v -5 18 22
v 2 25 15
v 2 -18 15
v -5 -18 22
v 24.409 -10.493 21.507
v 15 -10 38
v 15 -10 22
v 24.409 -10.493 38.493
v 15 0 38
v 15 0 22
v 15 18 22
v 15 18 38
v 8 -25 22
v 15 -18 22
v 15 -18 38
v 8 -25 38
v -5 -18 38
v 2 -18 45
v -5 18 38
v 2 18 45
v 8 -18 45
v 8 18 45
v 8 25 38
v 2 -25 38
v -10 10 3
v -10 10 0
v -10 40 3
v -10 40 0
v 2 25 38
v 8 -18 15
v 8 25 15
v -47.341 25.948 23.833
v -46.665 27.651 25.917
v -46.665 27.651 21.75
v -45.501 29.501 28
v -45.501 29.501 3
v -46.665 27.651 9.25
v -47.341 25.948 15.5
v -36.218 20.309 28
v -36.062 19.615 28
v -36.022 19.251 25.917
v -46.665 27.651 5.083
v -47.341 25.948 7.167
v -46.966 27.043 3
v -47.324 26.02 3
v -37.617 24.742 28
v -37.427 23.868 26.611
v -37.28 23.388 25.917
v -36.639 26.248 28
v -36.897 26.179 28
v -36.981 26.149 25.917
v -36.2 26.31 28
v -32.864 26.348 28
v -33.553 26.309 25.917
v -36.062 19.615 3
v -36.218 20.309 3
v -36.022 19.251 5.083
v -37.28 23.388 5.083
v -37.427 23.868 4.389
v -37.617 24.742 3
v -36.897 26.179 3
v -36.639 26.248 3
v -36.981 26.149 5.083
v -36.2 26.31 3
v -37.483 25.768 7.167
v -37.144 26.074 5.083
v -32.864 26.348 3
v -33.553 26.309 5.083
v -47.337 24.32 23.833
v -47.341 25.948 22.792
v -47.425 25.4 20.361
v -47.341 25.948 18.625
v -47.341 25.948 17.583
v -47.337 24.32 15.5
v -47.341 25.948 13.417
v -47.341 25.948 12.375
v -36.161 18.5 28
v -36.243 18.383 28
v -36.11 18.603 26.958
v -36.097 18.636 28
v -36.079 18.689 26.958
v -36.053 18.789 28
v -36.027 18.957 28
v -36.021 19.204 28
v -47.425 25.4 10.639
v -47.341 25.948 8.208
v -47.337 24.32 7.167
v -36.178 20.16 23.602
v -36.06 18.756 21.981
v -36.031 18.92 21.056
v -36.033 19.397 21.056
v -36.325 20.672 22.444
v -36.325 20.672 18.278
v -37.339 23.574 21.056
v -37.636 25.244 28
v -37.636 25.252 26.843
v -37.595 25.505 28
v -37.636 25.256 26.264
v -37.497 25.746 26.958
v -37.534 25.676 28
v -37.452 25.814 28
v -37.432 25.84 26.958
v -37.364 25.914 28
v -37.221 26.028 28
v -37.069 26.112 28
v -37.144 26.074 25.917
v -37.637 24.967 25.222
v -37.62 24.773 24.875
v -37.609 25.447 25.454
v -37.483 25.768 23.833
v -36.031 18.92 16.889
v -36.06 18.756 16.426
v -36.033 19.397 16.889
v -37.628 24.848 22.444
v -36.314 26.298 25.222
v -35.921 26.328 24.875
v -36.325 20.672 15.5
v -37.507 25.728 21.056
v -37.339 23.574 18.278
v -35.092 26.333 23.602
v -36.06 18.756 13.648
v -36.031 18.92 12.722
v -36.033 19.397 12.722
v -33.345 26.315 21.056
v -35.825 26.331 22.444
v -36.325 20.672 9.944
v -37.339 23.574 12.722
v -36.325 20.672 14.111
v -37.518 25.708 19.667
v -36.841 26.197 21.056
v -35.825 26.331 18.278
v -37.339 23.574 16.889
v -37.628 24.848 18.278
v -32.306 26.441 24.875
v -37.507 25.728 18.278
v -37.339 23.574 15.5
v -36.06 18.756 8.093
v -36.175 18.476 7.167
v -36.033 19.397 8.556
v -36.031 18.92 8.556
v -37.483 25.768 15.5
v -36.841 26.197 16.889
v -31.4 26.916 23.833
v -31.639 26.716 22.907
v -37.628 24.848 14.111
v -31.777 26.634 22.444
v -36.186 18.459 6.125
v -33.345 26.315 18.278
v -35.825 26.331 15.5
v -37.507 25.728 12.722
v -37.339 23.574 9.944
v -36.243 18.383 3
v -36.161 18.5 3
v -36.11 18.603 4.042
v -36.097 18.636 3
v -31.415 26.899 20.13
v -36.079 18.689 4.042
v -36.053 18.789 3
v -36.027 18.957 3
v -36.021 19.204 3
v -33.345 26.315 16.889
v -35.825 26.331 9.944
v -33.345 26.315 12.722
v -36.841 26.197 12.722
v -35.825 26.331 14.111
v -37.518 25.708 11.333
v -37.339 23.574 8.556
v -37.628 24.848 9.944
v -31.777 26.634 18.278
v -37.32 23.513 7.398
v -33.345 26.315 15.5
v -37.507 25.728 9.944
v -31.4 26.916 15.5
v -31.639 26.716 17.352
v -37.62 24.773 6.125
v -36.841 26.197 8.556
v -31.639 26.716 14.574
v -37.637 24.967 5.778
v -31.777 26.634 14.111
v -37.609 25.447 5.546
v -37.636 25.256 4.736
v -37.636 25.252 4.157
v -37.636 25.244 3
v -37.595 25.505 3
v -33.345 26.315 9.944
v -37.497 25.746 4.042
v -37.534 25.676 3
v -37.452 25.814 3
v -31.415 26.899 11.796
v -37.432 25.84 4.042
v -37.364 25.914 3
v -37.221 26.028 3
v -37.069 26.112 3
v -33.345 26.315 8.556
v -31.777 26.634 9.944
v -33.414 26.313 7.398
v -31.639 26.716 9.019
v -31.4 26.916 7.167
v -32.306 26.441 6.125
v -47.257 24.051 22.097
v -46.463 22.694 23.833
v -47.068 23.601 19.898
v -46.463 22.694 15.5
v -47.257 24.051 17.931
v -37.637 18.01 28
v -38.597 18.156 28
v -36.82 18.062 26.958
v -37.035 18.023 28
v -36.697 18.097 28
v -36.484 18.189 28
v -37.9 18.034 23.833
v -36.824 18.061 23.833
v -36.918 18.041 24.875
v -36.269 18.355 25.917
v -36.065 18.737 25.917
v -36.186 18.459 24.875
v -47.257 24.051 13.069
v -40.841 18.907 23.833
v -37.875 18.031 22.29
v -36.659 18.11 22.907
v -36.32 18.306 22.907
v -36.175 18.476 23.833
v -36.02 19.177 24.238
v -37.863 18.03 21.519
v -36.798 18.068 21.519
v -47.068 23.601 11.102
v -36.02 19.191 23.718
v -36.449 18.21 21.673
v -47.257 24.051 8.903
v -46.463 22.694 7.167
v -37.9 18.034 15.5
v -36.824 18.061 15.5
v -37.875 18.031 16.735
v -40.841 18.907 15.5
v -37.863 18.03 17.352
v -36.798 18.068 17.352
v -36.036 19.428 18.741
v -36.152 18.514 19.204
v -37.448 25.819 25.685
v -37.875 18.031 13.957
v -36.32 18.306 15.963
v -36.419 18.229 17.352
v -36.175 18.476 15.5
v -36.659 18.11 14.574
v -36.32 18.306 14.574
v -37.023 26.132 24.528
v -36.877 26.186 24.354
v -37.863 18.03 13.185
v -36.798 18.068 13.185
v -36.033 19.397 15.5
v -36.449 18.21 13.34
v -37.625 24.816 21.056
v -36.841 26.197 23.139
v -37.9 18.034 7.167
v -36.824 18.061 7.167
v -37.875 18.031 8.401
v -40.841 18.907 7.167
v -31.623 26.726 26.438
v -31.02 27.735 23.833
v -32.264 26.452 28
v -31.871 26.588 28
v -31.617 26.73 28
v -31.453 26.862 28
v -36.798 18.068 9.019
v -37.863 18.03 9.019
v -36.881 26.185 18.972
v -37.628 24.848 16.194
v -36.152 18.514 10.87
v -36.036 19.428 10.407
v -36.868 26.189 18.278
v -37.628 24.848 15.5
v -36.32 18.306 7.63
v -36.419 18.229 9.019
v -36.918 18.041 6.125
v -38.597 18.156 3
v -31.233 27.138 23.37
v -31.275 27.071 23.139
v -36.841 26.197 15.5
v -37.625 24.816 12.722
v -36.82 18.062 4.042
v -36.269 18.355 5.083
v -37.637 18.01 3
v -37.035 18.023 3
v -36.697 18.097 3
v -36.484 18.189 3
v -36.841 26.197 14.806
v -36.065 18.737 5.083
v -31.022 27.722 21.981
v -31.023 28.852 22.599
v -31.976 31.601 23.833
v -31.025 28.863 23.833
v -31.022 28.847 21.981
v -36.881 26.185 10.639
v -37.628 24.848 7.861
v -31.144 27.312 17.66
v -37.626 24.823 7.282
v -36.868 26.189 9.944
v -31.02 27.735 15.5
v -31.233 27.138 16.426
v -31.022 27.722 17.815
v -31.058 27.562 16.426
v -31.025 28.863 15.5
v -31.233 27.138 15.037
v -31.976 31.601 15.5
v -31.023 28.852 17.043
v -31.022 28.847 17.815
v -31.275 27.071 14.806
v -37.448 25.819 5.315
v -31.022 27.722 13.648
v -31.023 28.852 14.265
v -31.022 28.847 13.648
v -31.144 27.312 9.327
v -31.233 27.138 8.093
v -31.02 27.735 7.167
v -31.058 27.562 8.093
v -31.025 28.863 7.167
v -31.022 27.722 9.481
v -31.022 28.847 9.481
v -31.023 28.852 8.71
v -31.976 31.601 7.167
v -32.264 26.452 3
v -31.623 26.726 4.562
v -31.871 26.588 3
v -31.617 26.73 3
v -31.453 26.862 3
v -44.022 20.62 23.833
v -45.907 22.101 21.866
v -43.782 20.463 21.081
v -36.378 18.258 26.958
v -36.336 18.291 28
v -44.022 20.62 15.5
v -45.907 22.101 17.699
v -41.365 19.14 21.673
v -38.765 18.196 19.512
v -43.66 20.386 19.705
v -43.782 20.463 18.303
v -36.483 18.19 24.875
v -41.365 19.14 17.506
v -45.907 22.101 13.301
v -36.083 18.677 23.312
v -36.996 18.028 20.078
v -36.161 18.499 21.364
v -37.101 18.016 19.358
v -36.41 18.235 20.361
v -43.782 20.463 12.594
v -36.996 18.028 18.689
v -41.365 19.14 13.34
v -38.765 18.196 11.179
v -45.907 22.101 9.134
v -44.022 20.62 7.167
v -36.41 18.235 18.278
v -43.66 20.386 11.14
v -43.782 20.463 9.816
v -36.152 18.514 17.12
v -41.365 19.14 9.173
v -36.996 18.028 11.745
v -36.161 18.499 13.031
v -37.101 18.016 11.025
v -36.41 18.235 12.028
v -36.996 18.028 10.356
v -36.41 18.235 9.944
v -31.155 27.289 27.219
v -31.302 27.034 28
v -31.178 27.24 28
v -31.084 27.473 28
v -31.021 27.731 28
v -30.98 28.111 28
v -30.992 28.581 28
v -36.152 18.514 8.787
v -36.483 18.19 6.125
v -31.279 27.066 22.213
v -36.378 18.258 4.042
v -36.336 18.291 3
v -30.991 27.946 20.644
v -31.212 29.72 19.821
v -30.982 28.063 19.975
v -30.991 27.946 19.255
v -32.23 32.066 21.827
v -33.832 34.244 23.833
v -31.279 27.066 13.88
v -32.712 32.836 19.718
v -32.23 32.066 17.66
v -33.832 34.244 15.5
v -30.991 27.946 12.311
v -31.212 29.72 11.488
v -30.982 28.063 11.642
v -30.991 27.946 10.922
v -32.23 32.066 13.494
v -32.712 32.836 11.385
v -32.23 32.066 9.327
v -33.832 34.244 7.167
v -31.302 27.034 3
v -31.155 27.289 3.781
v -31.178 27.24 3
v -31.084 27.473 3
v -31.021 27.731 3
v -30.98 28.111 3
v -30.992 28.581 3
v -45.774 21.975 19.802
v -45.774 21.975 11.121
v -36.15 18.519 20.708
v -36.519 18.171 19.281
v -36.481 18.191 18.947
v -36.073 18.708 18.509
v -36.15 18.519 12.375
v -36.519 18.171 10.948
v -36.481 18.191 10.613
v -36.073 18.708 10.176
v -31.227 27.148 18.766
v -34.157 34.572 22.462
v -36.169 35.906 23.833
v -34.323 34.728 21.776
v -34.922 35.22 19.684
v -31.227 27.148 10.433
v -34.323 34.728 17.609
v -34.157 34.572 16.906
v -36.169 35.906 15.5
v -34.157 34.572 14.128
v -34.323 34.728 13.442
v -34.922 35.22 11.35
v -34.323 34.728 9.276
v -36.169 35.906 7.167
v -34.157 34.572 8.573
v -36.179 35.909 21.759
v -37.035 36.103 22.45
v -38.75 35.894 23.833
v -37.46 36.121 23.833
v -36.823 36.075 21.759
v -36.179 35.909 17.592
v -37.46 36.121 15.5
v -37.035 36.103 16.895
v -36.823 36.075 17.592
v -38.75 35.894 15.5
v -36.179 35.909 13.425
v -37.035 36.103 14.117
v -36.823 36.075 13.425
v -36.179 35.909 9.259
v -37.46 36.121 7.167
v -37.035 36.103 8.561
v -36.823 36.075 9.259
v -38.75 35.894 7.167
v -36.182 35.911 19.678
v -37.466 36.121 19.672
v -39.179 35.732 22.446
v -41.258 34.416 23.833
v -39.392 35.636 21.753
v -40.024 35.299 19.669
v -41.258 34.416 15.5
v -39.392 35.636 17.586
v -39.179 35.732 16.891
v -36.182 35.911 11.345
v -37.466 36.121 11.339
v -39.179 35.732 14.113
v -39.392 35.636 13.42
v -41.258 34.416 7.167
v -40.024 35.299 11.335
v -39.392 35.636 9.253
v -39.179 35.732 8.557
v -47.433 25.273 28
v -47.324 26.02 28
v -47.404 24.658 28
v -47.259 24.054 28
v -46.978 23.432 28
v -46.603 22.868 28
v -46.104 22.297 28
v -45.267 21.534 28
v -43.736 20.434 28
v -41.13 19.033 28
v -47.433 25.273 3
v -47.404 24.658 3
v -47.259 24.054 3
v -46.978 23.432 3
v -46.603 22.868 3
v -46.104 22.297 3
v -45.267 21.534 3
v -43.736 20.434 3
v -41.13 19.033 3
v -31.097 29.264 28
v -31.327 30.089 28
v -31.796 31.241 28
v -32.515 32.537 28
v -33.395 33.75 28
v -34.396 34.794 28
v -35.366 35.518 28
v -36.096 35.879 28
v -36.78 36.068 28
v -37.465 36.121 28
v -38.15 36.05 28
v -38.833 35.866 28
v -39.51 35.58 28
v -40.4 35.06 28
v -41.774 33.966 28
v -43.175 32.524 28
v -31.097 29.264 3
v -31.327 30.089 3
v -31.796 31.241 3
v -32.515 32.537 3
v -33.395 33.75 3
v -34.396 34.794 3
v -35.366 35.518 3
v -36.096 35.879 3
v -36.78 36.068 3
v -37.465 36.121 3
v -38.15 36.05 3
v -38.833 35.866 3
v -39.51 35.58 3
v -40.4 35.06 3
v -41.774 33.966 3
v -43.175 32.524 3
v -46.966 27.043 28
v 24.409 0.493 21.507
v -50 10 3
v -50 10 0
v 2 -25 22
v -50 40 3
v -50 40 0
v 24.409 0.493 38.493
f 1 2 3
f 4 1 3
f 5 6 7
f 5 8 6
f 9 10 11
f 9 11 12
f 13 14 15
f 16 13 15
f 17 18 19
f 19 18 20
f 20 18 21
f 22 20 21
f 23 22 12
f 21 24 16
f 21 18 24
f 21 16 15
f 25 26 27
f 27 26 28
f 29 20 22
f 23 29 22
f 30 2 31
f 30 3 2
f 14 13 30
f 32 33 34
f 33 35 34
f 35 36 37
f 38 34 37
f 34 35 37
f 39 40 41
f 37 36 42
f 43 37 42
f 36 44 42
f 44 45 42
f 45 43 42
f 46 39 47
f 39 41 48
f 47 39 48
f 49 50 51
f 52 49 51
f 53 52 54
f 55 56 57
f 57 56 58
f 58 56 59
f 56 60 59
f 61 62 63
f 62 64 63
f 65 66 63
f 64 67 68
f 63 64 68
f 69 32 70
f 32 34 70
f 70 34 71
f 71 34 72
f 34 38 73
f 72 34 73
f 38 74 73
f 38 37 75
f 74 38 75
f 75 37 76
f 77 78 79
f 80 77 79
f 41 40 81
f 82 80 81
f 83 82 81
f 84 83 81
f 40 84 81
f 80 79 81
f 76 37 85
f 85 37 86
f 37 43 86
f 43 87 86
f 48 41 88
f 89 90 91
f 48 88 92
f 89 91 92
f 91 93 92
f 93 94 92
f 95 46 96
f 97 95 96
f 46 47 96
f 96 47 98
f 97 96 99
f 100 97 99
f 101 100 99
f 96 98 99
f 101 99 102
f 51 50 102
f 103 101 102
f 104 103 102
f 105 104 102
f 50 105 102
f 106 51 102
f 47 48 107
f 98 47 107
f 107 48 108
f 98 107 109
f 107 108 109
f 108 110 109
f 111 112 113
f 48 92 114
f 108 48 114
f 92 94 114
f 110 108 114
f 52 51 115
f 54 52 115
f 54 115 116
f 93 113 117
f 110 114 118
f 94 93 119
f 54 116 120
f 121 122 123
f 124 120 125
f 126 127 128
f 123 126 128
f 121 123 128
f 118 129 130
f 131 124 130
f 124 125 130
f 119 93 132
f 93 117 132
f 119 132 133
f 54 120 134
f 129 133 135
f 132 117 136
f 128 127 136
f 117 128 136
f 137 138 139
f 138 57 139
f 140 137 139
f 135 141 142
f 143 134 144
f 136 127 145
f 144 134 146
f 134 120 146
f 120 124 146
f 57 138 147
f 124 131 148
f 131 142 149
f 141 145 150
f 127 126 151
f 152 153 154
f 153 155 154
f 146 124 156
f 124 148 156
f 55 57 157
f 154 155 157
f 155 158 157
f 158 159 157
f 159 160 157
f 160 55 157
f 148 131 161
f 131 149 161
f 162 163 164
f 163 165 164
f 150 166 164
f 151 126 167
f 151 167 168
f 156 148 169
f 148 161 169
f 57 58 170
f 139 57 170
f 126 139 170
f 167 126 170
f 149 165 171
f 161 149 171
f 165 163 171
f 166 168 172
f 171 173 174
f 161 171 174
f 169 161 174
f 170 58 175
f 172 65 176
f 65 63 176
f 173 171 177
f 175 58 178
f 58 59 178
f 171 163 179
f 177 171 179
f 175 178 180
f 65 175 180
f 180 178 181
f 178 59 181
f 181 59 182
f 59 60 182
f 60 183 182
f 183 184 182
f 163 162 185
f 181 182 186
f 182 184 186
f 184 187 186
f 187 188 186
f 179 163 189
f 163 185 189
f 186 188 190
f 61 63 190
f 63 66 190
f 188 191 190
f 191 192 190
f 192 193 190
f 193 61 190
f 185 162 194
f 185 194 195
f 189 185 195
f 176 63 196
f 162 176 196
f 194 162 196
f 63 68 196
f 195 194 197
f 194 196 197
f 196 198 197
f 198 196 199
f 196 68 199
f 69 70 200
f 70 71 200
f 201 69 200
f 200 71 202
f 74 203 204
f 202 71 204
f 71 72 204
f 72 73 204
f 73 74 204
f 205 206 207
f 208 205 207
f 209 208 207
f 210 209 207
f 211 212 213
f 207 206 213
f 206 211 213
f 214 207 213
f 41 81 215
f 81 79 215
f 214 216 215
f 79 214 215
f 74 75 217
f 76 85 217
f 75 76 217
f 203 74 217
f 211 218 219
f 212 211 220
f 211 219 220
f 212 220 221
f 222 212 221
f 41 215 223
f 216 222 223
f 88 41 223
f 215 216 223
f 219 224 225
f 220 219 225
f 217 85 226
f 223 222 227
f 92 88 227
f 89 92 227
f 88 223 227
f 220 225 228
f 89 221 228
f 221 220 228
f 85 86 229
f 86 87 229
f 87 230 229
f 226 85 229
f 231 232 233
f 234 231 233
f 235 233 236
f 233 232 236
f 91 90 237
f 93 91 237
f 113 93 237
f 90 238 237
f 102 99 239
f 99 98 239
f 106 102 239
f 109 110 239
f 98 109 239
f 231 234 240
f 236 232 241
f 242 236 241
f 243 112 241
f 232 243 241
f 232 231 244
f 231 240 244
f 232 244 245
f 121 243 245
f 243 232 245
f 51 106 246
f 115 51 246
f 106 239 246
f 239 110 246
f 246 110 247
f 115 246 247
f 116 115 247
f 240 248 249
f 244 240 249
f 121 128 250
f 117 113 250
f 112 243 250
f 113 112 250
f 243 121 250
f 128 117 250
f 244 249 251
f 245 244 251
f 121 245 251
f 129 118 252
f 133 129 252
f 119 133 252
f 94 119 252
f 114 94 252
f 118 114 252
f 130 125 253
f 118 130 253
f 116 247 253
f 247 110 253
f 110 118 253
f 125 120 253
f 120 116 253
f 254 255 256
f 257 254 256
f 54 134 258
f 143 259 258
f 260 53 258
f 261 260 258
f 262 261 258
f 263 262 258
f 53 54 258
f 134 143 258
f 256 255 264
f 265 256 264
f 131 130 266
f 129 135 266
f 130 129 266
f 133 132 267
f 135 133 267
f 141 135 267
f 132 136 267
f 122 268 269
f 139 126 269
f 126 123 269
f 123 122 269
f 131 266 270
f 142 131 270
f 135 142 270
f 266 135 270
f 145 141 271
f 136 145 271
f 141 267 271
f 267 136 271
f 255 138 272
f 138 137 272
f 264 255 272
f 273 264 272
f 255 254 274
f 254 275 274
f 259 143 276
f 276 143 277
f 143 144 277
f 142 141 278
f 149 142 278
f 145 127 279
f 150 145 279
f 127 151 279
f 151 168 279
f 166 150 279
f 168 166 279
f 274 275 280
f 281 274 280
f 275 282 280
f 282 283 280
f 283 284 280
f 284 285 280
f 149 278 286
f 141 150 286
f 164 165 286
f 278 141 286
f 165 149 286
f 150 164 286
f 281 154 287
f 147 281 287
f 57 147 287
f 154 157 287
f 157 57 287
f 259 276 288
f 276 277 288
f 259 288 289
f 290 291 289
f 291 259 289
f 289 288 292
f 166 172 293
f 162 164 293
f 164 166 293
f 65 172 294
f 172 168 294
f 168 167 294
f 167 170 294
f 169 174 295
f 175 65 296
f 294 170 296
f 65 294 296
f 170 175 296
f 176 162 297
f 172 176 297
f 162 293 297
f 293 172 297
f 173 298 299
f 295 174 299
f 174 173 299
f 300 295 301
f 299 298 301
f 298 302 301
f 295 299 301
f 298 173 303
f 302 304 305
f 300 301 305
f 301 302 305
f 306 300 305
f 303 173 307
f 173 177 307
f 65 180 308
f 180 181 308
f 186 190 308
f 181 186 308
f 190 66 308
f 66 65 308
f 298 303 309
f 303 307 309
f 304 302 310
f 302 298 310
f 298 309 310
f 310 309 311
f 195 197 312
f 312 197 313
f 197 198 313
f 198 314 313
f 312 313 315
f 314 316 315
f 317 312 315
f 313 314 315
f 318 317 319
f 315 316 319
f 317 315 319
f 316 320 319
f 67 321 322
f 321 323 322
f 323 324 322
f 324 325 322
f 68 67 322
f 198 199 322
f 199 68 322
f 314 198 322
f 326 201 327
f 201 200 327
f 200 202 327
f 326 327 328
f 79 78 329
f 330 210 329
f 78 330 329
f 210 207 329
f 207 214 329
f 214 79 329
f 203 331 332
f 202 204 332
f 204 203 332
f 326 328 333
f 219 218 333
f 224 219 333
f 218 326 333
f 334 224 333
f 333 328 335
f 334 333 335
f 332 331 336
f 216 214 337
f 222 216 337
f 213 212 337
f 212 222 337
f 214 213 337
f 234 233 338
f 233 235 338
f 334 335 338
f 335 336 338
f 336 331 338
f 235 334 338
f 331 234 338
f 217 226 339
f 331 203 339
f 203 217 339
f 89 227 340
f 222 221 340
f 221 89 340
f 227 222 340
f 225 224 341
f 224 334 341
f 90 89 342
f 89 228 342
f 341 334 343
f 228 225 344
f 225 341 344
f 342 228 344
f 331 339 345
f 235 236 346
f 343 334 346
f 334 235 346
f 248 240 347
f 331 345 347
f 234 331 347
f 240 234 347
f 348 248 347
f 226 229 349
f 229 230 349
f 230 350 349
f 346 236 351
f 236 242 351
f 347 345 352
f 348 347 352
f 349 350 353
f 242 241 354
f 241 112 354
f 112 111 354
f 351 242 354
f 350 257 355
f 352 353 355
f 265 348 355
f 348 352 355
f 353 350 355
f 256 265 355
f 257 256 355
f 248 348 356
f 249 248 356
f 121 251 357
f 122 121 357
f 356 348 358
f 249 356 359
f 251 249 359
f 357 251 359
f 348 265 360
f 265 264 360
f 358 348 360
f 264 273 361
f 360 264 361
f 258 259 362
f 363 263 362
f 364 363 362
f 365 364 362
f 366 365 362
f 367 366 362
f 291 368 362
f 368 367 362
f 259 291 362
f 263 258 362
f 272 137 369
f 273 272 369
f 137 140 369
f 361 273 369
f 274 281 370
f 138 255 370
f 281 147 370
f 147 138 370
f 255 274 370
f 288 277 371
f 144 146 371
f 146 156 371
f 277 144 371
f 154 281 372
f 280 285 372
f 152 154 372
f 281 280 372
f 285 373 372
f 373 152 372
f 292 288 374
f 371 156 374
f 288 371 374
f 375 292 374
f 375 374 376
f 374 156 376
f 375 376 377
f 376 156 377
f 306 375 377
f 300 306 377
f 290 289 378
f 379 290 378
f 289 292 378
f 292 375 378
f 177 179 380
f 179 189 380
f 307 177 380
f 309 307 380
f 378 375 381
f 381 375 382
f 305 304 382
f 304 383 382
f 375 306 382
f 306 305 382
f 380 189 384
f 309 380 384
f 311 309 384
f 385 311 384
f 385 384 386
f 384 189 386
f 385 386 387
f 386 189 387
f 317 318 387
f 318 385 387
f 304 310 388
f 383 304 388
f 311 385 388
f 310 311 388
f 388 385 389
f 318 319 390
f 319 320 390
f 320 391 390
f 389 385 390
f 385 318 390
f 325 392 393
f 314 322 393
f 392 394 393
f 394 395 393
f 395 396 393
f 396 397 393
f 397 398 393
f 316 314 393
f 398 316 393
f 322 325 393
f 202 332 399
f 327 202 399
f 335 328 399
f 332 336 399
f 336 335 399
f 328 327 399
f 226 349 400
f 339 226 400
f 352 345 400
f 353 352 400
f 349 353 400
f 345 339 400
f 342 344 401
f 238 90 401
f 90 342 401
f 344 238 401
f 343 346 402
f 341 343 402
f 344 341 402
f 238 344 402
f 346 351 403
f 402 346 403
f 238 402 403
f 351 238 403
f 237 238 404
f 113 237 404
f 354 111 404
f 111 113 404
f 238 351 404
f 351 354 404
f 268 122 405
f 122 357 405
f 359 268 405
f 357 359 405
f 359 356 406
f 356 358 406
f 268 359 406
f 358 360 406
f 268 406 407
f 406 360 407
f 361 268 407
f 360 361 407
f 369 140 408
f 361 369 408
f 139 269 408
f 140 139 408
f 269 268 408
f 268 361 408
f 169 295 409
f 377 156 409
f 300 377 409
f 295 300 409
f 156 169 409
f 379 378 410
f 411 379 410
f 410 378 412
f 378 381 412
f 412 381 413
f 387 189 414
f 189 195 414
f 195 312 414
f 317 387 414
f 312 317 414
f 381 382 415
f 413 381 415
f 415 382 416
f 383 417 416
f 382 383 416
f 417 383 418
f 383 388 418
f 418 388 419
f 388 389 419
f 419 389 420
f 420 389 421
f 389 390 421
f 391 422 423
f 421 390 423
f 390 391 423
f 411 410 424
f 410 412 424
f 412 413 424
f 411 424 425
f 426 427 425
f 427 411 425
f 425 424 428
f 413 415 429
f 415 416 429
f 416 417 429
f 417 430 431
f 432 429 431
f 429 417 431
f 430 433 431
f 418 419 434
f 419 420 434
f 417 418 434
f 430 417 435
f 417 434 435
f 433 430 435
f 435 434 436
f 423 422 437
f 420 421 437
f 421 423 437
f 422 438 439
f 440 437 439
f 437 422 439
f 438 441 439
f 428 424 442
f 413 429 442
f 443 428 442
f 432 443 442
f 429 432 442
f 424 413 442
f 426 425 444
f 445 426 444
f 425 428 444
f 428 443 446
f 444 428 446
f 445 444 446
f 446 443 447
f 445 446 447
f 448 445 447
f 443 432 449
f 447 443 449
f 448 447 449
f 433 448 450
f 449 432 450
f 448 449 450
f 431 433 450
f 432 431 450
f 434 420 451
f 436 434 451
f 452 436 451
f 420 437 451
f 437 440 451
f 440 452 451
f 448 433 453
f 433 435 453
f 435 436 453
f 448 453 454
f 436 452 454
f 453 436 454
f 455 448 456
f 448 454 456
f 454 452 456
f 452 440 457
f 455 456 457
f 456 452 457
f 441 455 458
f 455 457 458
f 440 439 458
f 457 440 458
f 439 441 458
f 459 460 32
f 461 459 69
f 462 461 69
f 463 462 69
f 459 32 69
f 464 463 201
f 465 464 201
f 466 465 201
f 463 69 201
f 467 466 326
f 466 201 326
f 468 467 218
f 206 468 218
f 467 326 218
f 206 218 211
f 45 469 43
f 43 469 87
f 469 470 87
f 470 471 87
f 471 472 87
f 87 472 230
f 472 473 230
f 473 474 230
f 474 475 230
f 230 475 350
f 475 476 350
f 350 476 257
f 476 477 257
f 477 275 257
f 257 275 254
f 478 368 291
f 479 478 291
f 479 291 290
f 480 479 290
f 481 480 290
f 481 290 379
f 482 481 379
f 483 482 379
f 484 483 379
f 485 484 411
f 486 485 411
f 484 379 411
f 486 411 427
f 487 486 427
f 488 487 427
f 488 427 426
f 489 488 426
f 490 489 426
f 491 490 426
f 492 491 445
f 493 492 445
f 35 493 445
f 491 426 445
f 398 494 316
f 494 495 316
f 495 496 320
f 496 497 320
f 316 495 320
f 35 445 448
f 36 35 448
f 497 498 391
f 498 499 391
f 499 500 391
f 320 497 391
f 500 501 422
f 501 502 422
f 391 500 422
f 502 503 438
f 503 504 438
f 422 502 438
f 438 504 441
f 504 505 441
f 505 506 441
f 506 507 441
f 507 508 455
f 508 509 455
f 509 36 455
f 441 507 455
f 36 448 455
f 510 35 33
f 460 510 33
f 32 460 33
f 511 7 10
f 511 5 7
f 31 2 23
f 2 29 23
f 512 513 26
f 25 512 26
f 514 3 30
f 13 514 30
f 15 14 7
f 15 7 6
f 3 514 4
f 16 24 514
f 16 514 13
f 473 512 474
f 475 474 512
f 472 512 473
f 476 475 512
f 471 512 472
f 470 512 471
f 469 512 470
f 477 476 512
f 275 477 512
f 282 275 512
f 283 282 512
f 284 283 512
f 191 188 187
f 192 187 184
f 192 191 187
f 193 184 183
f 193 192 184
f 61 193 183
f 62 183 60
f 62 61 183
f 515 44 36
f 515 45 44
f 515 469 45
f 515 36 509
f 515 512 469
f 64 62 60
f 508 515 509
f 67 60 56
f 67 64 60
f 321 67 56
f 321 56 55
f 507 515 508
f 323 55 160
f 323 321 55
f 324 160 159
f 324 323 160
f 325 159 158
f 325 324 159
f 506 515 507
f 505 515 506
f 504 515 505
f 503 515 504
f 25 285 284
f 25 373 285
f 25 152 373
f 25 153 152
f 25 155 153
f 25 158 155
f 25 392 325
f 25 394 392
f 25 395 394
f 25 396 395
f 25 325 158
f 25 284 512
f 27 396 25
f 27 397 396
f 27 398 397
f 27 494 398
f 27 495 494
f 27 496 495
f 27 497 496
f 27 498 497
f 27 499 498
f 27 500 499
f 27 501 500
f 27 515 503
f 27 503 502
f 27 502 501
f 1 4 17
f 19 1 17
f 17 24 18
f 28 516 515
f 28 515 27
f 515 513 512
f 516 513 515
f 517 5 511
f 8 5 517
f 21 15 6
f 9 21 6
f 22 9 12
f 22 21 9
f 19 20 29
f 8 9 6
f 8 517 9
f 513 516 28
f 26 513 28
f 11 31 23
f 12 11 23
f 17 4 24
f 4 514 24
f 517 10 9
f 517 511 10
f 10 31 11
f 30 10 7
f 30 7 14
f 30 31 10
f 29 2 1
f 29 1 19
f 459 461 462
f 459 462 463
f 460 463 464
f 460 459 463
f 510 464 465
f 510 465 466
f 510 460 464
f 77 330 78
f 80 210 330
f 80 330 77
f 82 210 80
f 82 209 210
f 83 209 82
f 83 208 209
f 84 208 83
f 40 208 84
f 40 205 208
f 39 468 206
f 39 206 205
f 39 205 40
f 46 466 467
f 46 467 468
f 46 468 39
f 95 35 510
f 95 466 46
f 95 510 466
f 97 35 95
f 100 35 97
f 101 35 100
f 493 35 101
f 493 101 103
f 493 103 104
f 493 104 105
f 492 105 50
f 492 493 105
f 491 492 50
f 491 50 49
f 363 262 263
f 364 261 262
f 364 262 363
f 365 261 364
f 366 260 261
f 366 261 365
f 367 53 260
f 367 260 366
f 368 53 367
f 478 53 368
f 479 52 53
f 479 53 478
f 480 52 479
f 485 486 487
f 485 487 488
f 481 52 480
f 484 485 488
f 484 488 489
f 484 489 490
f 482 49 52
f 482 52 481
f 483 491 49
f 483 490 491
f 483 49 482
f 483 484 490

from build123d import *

# Parameters (mm, degrees)
F0_W     = 40
F0_H     = 30
F1_DEPTH = 3
F2_W     = 20
F2_H     = 30
F3_DEPTH = 25
F4_SIZE  = 7
F6_DEPTH = 25
F7_W     = 10
F7_H     = 16
F8_DEPTH = 9.4092879444
F8_TAPER = -3


with BuildPart() as f1:
    # F0 (on Top) → F1 (new body)
    with BuildSketch(Plane.XY):
        with Locations((-30, 25)):
            Rectangle(F0_W, F0_H)
    extrude(amount=F1_DEPTH)

    # F5 (on face) → F6 (join)
    with BuildSketch(Plane.XY.offset(3)):
        with BuildLine():
            add(Edge.make_bspline(
                [(-45.5009639263, 29.5013263822), (-47.2935786919, 26.9028030822), (-49.5660748007, 22.3358883557), (-31.5912436874, 14.2675803547), (-41.1310284025, 28.562782317), (-27.4171372754, 23.7993421626), (-36.1785425543, 41.2178835314), (-43.2008762113, 32.8354680137), (-45.5009639263, 29.5013263822)],
                knots=[0, 0, 0, 0, 0.1479609041, 0.3361347491, 0.489729632, 0.6301338361, 0.8101527085, 1, 1, 1, 1], degree=3))
        make_face()
    extrude(amount=F6_DEPTH)


with BuildPart() as f3:
    # F2 (on Front) → F3 (new body, symmetric)
    with BuildSketch(Plane.XZ):
        with Locations((5, 30)):
            Rectangle(F2_W, F2_H)
    extrude(amount=F3_DEPTH, both=True)

    # F4
    f4_edges = [f3.edges().sort_by_distance(p)[0] for p in [
        (5, -25, 45),
        (-5, -25, 30),
        (5, -25, 15),
        (15, -25, 30),
        (5, 25, 45),
        (-5, 0, 45),
        (15, 0, 45),
        (15, 25, 30),
        (15, 0, 15),
        (-5, 25, 30),
        (-5, 0, 15),
    ]]
    chamfer(f4_edges, length=F4_SIZE)

    # F7 (on face) → F8 (join)
    with BuildSketch(Plane.YZ.offset(15)):
        with Locations((-5, 30)):
            Rectangle(F7_W, F7_H)
    extrude(amount=F8_DEPTH, taper=F8_TAPER)


solid = Compound([f1.part, f3.part])
